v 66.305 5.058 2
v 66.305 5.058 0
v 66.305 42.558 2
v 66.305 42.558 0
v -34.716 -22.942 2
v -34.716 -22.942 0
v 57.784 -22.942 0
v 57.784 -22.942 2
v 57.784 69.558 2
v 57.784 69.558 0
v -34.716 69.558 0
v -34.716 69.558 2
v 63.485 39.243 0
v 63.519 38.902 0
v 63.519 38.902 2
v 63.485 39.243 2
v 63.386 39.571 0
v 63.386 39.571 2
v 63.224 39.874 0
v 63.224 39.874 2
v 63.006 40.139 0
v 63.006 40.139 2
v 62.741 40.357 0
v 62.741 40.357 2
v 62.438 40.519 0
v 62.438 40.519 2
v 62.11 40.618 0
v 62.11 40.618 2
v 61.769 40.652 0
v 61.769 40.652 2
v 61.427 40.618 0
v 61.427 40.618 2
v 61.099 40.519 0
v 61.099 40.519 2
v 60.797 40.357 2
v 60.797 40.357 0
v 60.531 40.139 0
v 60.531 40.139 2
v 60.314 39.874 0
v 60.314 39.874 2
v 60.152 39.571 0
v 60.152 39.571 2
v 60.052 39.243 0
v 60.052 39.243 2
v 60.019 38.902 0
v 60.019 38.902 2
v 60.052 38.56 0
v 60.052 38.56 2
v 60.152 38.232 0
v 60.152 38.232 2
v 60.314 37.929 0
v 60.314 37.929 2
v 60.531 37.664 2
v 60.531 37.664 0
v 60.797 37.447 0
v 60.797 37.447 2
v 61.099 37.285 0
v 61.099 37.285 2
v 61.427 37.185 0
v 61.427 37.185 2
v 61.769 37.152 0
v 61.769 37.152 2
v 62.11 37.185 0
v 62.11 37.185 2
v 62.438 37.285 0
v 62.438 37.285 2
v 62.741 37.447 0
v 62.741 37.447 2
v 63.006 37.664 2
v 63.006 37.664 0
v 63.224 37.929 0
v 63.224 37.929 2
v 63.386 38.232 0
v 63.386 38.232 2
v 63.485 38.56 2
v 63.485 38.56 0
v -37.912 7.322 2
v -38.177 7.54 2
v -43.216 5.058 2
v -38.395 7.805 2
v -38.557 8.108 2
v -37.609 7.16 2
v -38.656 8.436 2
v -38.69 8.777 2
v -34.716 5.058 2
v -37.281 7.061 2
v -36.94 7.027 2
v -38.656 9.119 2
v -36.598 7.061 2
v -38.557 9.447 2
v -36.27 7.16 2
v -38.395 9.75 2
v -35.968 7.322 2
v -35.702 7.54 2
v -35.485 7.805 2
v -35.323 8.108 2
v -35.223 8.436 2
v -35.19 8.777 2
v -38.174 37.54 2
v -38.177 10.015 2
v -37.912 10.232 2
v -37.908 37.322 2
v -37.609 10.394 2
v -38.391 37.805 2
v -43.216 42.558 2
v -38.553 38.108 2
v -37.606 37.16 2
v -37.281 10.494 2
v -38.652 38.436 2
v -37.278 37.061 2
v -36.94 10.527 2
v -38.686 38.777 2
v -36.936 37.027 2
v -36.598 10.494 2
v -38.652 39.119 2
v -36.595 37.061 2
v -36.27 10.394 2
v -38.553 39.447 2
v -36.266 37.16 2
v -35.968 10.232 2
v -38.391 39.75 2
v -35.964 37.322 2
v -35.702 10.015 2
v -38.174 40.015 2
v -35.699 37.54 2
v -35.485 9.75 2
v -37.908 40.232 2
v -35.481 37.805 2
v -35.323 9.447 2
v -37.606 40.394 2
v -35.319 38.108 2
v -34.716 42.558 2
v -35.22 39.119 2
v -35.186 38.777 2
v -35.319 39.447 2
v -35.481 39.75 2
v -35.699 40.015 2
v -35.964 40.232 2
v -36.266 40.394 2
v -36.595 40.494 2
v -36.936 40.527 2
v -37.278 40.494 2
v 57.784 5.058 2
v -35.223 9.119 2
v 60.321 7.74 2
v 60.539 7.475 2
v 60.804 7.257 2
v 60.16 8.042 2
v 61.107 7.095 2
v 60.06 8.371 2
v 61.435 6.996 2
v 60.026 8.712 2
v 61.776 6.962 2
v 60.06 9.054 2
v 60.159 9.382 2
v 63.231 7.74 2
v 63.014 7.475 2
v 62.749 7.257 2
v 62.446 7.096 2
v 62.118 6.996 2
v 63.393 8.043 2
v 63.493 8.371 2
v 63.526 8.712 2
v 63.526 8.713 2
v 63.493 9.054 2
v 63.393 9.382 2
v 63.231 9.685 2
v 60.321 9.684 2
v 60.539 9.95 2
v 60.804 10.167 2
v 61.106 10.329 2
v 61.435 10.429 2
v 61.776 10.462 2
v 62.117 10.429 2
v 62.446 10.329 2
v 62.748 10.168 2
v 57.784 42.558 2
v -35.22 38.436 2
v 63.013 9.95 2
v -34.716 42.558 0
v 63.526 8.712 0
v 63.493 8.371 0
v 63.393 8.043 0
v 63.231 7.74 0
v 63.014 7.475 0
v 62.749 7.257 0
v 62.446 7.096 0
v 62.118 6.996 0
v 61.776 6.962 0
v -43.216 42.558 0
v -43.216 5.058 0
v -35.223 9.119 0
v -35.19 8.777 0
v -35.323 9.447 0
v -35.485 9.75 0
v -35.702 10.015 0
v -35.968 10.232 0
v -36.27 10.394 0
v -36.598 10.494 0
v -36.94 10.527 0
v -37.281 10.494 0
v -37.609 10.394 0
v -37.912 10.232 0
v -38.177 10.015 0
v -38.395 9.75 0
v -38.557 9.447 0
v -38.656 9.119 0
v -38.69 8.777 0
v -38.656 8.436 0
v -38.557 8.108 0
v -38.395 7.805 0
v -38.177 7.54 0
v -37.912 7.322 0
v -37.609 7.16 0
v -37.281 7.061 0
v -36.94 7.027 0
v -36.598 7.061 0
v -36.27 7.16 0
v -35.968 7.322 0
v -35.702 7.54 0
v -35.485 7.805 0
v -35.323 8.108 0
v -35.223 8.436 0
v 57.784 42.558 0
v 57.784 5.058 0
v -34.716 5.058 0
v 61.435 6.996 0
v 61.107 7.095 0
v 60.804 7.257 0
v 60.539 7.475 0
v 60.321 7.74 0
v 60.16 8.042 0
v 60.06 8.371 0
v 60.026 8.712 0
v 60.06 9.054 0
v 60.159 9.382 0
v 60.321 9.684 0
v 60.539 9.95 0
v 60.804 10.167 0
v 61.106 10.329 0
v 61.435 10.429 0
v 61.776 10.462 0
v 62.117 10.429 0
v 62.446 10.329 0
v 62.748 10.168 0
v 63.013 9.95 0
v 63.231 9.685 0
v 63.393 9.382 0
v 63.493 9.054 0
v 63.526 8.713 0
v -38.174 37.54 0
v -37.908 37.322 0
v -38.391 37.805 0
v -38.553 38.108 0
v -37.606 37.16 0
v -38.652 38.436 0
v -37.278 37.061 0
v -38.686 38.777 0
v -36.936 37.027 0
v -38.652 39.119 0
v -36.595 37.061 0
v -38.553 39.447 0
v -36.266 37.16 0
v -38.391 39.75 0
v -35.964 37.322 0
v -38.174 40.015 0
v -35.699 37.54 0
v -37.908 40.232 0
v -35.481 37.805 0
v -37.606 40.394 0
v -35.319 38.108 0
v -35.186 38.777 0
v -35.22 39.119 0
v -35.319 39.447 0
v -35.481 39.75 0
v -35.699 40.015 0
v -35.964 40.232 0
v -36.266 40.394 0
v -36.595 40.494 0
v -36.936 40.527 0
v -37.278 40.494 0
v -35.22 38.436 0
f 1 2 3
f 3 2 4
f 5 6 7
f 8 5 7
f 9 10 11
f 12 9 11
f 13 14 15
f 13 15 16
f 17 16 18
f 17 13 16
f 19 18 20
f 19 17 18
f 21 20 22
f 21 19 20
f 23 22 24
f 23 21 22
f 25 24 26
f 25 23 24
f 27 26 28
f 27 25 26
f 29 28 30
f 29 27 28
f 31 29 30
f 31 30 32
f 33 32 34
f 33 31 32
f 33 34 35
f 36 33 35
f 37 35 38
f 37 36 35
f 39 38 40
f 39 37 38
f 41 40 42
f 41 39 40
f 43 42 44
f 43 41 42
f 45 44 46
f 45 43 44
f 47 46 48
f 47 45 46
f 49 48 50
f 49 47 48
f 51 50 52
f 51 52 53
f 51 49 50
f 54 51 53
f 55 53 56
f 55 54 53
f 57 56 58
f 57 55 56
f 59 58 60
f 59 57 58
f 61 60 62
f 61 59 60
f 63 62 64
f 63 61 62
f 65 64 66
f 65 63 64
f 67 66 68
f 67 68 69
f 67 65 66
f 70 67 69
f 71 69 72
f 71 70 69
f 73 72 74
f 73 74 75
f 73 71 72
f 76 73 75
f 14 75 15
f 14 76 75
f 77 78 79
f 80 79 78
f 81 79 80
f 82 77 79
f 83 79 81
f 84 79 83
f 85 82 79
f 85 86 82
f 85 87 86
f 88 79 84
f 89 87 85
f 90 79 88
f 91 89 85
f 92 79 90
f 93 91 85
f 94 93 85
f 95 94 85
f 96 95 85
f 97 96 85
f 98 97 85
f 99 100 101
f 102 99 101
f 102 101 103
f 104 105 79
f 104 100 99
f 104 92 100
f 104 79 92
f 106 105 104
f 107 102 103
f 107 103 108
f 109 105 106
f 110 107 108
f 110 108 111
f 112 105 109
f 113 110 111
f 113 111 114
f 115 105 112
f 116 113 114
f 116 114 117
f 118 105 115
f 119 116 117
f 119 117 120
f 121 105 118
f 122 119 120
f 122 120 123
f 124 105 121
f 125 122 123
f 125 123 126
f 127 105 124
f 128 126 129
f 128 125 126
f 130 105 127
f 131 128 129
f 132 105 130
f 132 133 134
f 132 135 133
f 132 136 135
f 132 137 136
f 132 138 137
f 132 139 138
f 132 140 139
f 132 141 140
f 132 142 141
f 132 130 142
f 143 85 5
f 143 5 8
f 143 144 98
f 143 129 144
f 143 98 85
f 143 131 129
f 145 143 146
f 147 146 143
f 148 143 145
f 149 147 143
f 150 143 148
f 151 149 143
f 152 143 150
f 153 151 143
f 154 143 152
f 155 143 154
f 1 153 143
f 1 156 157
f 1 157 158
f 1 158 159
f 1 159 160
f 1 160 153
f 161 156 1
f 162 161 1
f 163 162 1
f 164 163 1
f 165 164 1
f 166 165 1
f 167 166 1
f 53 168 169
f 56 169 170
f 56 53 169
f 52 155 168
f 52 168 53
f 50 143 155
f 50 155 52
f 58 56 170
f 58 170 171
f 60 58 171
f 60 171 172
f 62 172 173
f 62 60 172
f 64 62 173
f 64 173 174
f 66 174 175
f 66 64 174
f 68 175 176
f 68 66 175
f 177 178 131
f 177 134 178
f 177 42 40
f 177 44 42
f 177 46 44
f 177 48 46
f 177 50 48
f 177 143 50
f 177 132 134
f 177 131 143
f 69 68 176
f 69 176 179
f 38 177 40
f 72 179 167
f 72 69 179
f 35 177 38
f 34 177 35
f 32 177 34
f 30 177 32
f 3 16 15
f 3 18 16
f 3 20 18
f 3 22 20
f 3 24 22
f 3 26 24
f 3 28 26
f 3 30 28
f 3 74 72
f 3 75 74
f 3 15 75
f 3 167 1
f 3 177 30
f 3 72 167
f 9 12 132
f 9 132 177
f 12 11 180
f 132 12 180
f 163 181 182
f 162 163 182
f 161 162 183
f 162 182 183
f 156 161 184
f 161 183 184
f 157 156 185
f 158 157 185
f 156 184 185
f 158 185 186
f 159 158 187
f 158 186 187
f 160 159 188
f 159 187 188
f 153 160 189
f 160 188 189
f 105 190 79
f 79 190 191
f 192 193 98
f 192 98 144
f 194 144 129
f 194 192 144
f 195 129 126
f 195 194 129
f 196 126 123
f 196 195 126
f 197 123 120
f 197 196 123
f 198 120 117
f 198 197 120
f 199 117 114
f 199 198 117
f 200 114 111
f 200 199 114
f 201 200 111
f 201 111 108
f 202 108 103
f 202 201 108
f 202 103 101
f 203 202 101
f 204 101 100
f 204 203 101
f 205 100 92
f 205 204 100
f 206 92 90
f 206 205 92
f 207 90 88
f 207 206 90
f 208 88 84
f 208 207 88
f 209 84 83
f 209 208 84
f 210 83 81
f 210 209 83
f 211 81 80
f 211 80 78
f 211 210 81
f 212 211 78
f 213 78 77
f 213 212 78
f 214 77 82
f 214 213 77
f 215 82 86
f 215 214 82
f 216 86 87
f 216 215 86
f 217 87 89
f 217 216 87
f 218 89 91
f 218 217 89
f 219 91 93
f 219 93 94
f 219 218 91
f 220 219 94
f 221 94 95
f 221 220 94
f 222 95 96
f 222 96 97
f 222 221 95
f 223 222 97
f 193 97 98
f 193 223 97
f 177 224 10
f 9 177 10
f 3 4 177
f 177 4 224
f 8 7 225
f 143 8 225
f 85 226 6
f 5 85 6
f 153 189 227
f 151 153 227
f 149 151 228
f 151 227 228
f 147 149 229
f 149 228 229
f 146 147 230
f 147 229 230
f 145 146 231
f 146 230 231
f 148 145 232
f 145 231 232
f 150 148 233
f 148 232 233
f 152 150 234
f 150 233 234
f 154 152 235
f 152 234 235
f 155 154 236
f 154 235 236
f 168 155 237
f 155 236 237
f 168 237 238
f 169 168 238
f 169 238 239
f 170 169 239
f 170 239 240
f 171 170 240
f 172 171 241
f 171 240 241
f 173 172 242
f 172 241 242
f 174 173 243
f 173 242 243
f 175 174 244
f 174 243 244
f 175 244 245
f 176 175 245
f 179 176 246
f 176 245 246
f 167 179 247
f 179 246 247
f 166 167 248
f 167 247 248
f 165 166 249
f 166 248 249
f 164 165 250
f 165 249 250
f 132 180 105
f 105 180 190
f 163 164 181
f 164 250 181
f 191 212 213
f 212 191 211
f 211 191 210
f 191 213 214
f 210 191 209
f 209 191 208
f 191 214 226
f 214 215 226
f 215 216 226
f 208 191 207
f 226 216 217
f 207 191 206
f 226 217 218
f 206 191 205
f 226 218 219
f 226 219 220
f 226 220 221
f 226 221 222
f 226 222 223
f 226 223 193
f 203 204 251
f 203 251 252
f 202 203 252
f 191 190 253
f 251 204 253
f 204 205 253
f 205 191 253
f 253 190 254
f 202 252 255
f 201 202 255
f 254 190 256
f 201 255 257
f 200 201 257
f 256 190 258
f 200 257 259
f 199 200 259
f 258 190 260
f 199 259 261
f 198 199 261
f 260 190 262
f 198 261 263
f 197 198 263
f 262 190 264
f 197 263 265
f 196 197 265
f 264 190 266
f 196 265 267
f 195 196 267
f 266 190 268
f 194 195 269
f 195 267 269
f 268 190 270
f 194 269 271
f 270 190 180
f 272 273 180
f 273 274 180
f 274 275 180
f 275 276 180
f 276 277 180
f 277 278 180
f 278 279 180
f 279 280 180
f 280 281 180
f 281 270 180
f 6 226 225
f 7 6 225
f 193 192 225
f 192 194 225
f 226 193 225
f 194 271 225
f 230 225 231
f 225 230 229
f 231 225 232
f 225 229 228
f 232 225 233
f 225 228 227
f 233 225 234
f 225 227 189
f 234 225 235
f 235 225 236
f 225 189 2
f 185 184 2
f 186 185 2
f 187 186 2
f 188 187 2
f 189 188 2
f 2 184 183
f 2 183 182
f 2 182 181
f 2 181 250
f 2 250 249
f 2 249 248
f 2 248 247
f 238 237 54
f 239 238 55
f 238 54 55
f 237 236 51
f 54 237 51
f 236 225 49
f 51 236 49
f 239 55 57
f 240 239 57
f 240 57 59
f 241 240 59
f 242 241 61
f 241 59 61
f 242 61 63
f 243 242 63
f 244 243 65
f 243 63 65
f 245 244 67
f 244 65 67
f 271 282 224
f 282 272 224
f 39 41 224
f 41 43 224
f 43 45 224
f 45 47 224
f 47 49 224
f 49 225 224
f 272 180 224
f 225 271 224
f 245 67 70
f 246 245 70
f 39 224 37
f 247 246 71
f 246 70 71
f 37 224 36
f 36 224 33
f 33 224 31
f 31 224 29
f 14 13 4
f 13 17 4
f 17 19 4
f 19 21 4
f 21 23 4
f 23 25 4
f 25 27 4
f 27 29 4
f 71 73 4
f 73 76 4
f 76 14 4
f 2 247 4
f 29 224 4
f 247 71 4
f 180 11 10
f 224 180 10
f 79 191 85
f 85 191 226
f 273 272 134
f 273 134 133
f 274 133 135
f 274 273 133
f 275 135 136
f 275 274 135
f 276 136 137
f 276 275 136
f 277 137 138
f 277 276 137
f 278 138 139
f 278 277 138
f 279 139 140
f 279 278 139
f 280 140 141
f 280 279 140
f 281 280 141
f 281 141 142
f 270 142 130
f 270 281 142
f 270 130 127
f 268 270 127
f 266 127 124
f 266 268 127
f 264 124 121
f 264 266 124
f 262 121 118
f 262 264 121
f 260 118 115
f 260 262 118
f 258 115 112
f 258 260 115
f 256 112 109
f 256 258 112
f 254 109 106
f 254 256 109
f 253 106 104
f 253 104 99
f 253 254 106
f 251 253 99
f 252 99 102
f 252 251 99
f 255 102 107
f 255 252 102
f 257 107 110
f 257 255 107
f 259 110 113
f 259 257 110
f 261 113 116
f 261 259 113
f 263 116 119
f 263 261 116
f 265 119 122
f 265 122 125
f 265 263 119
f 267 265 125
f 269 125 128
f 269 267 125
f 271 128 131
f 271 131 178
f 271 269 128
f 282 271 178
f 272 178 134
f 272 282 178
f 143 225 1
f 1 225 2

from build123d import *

# Parameters (mm, degrees)
F0_R     = 1.75
F1_DEPTH = 2


with BuildPart() as f1:
    # F0 (on Top) → F1 (new body)
    with BuildSketch(Plane.XY):
        with BuildLine():
            Line((57.7837471709, 69.5580622628), (-34.7162528291, 69.5580622628))
            Line((-34.7162528291, 69.5580622628), (-34.7162528291, 42.5580622628))
            Line((-34.7162528291, 42.5580622628), (-43.2162528291, 42.5580622628))
            Line((-43.2162528291, 42.5580622628), (-43.2162528291, 5.0580622628))
            Line((-43.2162528291, 5.0580622628), (-34.7162528291, 5.0580622628))
            Line((-34.7162528291, 5.0580622628), (-34.7162528291, -22.9419377372))
            Line((-34.7162528291, -22.9419377372), (57.7837471709, -22.9419377372))
            Line((57.7837471709, -22.9419377372), (57.7837471709, 5.0580622628))
            Line((57.7837471709, 5.0580622628), (61.776727438, 5.0580622628))
            Line((61.776727438, 5.0580622628), (61.7764500569, 6.9623562581))
            ThreePointArc((61.7764500569, 6.9623562581), (60.5385780505, 9.9496128474), (63.5261951319, 8.712611146))
            Line((63.5261951319, 8.712611146), (66.3054800854, 8.713015979))
            Line((66.3054800854, 8.713015979), (66.3054800854, 42.5580622628))
            Line((66.3054800854, 42.5580622628), (57.7837471709, 42.5580622628))
            Line((57.7837471709, 42.5580622628), (57.7837471709, 69.5580622628))
        make_face()
        with Locations((-36.9397651508, 8.7772880495)):
            Circle(F0_R, mode=Mode.SUBTRACT)
        with Locations((-36.9361157864, 38.7772880495)):
            Circle(F0_R, mode=Mode.SUBTRACT)
        with Locations((61.7687867672, 38.9017461427)):
            Circle(F0_R, mode=Mode.SUBTRACT)
        with BuildLine():
            Line((66.3054800854, 5.0580622628), (66.3054800854, 8.713015979))
            Line((66.3054800854, 8.713015979), (63.5261951319, 8.712611146))
            ThreePointArc((63.5261951319, 8.712611146), (63.5261951458, 8.7124836928), (63.5261951505, 8.7123562396))
            ThreePointArc((63.5261951505, 8.7123562396), (63.0137221373, 7.4750094988), (61.7764500569, 6.9623562581))
            Line((61.7764500569, 6.9623562581), (61.776727438, 5.0580622628))
            Line((61.776727438, 5.0580622628), (66.3054800854, 5.0580622628))
        make_face()
    extrude(amount=F1_DEPTH)


solid = f1.part
